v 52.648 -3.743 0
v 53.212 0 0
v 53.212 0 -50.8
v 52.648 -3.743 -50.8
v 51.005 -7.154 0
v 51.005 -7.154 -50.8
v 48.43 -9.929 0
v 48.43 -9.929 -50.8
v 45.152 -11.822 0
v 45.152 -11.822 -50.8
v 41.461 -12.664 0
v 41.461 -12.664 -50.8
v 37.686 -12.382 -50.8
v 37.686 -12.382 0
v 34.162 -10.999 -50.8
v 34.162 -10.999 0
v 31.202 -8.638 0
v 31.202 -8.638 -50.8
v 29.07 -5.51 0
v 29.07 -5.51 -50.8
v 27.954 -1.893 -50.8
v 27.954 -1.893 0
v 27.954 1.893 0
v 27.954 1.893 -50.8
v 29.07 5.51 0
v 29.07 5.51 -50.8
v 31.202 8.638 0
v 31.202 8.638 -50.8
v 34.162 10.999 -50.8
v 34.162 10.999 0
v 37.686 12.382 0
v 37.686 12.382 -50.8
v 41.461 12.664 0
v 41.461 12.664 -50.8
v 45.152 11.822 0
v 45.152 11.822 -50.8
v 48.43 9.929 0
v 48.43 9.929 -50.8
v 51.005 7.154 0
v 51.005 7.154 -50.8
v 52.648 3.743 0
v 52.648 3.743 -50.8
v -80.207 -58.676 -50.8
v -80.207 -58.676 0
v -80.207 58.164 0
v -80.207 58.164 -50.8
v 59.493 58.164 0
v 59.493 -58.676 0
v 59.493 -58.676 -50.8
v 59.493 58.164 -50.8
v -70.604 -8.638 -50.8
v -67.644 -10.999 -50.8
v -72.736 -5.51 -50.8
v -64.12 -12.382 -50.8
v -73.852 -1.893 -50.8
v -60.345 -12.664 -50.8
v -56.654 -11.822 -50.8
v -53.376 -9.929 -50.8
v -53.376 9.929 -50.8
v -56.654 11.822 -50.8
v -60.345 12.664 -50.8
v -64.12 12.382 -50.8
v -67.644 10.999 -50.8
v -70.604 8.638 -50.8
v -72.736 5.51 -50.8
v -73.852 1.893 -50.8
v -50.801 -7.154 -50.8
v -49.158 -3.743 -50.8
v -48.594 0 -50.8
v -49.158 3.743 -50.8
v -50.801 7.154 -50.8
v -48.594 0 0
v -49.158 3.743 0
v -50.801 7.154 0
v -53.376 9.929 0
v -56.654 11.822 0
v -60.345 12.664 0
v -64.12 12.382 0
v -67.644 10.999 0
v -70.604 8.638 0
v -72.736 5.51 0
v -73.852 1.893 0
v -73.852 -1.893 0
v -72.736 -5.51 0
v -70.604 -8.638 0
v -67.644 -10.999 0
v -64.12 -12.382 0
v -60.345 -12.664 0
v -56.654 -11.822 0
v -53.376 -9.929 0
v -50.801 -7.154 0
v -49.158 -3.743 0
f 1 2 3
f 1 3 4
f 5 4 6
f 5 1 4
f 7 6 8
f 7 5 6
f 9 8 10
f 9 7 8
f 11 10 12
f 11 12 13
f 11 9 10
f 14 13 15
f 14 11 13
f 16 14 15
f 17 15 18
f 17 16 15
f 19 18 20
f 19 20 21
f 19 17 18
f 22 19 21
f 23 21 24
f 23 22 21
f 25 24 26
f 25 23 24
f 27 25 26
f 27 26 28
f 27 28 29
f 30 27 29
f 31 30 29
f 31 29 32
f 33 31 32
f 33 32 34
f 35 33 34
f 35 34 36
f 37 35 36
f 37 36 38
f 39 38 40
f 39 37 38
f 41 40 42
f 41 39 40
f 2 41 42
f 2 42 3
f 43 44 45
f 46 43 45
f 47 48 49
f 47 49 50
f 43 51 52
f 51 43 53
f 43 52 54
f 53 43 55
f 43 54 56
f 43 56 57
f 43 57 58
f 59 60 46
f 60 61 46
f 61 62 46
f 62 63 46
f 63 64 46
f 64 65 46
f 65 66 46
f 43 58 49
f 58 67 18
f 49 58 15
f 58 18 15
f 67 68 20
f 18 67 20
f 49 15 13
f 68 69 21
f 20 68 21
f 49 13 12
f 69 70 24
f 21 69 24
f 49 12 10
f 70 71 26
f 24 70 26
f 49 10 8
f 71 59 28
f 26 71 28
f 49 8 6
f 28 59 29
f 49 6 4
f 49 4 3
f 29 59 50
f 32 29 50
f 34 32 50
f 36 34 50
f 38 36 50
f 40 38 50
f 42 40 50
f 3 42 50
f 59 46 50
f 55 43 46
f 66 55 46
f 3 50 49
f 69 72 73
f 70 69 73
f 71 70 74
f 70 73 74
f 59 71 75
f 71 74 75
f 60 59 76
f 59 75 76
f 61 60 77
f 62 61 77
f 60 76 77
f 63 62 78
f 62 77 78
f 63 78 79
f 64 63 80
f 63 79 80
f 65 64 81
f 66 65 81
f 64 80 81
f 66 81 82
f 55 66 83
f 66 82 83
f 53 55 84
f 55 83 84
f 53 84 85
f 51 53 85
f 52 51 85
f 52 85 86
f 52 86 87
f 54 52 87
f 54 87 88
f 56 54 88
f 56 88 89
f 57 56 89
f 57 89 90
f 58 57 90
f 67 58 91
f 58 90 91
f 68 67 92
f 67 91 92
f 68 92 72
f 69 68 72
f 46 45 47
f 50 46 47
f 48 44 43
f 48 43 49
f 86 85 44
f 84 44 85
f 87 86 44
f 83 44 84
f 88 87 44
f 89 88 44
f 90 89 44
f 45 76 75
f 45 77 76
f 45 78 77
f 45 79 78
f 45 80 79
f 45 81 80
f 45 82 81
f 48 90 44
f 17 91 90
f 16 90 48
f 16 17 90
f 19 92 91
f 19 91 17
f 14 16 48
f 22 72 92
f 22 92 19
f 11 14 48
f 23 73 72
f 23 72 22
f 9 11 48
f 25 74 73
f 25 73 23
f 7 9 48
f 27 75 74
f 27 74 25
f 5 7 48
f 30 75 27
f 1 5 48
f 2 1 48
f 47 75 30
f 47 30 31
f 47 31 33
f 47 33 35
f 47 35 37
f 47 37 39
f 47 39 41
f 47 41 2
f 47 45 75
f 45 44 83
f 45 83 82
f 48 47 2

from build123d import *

# Parameters (mm, degrees)
F0_W     = 139.7
F0_H     = 116.84
F0_R     = 12.7
F1_DEPTH = 50.8


# Not quite as in the source:
# - the program builds the solid bodies; features that only make, move or delete a surface that nothing else refers to are left out


with BuildPart() as f1:
    # F0 (on Top) → F1 (new body)
    with BuildSketch(Plane.XY):
        with Locations((-10.3572173724, -0.2563824468)):
            Rectangle(F0_W, F0_H)
        with Locations((-61.2939819694, 0)):
            Circle(F0_R, mode=Mode.SUBTRACT)
        with BuildLine():
            ThreePointArc((27.8118101201, 0), (40.5118101201, 12.7), (53.2118101201, 0))
            ThreePointArc((53.2118101201, 0), (40.5118101201, -12.7), (27.8118101201, 0))
        make_face(mode=Mode.SUBTRACT)
    extrude(amount=-F1_DEPTH)


solid = f1.part
